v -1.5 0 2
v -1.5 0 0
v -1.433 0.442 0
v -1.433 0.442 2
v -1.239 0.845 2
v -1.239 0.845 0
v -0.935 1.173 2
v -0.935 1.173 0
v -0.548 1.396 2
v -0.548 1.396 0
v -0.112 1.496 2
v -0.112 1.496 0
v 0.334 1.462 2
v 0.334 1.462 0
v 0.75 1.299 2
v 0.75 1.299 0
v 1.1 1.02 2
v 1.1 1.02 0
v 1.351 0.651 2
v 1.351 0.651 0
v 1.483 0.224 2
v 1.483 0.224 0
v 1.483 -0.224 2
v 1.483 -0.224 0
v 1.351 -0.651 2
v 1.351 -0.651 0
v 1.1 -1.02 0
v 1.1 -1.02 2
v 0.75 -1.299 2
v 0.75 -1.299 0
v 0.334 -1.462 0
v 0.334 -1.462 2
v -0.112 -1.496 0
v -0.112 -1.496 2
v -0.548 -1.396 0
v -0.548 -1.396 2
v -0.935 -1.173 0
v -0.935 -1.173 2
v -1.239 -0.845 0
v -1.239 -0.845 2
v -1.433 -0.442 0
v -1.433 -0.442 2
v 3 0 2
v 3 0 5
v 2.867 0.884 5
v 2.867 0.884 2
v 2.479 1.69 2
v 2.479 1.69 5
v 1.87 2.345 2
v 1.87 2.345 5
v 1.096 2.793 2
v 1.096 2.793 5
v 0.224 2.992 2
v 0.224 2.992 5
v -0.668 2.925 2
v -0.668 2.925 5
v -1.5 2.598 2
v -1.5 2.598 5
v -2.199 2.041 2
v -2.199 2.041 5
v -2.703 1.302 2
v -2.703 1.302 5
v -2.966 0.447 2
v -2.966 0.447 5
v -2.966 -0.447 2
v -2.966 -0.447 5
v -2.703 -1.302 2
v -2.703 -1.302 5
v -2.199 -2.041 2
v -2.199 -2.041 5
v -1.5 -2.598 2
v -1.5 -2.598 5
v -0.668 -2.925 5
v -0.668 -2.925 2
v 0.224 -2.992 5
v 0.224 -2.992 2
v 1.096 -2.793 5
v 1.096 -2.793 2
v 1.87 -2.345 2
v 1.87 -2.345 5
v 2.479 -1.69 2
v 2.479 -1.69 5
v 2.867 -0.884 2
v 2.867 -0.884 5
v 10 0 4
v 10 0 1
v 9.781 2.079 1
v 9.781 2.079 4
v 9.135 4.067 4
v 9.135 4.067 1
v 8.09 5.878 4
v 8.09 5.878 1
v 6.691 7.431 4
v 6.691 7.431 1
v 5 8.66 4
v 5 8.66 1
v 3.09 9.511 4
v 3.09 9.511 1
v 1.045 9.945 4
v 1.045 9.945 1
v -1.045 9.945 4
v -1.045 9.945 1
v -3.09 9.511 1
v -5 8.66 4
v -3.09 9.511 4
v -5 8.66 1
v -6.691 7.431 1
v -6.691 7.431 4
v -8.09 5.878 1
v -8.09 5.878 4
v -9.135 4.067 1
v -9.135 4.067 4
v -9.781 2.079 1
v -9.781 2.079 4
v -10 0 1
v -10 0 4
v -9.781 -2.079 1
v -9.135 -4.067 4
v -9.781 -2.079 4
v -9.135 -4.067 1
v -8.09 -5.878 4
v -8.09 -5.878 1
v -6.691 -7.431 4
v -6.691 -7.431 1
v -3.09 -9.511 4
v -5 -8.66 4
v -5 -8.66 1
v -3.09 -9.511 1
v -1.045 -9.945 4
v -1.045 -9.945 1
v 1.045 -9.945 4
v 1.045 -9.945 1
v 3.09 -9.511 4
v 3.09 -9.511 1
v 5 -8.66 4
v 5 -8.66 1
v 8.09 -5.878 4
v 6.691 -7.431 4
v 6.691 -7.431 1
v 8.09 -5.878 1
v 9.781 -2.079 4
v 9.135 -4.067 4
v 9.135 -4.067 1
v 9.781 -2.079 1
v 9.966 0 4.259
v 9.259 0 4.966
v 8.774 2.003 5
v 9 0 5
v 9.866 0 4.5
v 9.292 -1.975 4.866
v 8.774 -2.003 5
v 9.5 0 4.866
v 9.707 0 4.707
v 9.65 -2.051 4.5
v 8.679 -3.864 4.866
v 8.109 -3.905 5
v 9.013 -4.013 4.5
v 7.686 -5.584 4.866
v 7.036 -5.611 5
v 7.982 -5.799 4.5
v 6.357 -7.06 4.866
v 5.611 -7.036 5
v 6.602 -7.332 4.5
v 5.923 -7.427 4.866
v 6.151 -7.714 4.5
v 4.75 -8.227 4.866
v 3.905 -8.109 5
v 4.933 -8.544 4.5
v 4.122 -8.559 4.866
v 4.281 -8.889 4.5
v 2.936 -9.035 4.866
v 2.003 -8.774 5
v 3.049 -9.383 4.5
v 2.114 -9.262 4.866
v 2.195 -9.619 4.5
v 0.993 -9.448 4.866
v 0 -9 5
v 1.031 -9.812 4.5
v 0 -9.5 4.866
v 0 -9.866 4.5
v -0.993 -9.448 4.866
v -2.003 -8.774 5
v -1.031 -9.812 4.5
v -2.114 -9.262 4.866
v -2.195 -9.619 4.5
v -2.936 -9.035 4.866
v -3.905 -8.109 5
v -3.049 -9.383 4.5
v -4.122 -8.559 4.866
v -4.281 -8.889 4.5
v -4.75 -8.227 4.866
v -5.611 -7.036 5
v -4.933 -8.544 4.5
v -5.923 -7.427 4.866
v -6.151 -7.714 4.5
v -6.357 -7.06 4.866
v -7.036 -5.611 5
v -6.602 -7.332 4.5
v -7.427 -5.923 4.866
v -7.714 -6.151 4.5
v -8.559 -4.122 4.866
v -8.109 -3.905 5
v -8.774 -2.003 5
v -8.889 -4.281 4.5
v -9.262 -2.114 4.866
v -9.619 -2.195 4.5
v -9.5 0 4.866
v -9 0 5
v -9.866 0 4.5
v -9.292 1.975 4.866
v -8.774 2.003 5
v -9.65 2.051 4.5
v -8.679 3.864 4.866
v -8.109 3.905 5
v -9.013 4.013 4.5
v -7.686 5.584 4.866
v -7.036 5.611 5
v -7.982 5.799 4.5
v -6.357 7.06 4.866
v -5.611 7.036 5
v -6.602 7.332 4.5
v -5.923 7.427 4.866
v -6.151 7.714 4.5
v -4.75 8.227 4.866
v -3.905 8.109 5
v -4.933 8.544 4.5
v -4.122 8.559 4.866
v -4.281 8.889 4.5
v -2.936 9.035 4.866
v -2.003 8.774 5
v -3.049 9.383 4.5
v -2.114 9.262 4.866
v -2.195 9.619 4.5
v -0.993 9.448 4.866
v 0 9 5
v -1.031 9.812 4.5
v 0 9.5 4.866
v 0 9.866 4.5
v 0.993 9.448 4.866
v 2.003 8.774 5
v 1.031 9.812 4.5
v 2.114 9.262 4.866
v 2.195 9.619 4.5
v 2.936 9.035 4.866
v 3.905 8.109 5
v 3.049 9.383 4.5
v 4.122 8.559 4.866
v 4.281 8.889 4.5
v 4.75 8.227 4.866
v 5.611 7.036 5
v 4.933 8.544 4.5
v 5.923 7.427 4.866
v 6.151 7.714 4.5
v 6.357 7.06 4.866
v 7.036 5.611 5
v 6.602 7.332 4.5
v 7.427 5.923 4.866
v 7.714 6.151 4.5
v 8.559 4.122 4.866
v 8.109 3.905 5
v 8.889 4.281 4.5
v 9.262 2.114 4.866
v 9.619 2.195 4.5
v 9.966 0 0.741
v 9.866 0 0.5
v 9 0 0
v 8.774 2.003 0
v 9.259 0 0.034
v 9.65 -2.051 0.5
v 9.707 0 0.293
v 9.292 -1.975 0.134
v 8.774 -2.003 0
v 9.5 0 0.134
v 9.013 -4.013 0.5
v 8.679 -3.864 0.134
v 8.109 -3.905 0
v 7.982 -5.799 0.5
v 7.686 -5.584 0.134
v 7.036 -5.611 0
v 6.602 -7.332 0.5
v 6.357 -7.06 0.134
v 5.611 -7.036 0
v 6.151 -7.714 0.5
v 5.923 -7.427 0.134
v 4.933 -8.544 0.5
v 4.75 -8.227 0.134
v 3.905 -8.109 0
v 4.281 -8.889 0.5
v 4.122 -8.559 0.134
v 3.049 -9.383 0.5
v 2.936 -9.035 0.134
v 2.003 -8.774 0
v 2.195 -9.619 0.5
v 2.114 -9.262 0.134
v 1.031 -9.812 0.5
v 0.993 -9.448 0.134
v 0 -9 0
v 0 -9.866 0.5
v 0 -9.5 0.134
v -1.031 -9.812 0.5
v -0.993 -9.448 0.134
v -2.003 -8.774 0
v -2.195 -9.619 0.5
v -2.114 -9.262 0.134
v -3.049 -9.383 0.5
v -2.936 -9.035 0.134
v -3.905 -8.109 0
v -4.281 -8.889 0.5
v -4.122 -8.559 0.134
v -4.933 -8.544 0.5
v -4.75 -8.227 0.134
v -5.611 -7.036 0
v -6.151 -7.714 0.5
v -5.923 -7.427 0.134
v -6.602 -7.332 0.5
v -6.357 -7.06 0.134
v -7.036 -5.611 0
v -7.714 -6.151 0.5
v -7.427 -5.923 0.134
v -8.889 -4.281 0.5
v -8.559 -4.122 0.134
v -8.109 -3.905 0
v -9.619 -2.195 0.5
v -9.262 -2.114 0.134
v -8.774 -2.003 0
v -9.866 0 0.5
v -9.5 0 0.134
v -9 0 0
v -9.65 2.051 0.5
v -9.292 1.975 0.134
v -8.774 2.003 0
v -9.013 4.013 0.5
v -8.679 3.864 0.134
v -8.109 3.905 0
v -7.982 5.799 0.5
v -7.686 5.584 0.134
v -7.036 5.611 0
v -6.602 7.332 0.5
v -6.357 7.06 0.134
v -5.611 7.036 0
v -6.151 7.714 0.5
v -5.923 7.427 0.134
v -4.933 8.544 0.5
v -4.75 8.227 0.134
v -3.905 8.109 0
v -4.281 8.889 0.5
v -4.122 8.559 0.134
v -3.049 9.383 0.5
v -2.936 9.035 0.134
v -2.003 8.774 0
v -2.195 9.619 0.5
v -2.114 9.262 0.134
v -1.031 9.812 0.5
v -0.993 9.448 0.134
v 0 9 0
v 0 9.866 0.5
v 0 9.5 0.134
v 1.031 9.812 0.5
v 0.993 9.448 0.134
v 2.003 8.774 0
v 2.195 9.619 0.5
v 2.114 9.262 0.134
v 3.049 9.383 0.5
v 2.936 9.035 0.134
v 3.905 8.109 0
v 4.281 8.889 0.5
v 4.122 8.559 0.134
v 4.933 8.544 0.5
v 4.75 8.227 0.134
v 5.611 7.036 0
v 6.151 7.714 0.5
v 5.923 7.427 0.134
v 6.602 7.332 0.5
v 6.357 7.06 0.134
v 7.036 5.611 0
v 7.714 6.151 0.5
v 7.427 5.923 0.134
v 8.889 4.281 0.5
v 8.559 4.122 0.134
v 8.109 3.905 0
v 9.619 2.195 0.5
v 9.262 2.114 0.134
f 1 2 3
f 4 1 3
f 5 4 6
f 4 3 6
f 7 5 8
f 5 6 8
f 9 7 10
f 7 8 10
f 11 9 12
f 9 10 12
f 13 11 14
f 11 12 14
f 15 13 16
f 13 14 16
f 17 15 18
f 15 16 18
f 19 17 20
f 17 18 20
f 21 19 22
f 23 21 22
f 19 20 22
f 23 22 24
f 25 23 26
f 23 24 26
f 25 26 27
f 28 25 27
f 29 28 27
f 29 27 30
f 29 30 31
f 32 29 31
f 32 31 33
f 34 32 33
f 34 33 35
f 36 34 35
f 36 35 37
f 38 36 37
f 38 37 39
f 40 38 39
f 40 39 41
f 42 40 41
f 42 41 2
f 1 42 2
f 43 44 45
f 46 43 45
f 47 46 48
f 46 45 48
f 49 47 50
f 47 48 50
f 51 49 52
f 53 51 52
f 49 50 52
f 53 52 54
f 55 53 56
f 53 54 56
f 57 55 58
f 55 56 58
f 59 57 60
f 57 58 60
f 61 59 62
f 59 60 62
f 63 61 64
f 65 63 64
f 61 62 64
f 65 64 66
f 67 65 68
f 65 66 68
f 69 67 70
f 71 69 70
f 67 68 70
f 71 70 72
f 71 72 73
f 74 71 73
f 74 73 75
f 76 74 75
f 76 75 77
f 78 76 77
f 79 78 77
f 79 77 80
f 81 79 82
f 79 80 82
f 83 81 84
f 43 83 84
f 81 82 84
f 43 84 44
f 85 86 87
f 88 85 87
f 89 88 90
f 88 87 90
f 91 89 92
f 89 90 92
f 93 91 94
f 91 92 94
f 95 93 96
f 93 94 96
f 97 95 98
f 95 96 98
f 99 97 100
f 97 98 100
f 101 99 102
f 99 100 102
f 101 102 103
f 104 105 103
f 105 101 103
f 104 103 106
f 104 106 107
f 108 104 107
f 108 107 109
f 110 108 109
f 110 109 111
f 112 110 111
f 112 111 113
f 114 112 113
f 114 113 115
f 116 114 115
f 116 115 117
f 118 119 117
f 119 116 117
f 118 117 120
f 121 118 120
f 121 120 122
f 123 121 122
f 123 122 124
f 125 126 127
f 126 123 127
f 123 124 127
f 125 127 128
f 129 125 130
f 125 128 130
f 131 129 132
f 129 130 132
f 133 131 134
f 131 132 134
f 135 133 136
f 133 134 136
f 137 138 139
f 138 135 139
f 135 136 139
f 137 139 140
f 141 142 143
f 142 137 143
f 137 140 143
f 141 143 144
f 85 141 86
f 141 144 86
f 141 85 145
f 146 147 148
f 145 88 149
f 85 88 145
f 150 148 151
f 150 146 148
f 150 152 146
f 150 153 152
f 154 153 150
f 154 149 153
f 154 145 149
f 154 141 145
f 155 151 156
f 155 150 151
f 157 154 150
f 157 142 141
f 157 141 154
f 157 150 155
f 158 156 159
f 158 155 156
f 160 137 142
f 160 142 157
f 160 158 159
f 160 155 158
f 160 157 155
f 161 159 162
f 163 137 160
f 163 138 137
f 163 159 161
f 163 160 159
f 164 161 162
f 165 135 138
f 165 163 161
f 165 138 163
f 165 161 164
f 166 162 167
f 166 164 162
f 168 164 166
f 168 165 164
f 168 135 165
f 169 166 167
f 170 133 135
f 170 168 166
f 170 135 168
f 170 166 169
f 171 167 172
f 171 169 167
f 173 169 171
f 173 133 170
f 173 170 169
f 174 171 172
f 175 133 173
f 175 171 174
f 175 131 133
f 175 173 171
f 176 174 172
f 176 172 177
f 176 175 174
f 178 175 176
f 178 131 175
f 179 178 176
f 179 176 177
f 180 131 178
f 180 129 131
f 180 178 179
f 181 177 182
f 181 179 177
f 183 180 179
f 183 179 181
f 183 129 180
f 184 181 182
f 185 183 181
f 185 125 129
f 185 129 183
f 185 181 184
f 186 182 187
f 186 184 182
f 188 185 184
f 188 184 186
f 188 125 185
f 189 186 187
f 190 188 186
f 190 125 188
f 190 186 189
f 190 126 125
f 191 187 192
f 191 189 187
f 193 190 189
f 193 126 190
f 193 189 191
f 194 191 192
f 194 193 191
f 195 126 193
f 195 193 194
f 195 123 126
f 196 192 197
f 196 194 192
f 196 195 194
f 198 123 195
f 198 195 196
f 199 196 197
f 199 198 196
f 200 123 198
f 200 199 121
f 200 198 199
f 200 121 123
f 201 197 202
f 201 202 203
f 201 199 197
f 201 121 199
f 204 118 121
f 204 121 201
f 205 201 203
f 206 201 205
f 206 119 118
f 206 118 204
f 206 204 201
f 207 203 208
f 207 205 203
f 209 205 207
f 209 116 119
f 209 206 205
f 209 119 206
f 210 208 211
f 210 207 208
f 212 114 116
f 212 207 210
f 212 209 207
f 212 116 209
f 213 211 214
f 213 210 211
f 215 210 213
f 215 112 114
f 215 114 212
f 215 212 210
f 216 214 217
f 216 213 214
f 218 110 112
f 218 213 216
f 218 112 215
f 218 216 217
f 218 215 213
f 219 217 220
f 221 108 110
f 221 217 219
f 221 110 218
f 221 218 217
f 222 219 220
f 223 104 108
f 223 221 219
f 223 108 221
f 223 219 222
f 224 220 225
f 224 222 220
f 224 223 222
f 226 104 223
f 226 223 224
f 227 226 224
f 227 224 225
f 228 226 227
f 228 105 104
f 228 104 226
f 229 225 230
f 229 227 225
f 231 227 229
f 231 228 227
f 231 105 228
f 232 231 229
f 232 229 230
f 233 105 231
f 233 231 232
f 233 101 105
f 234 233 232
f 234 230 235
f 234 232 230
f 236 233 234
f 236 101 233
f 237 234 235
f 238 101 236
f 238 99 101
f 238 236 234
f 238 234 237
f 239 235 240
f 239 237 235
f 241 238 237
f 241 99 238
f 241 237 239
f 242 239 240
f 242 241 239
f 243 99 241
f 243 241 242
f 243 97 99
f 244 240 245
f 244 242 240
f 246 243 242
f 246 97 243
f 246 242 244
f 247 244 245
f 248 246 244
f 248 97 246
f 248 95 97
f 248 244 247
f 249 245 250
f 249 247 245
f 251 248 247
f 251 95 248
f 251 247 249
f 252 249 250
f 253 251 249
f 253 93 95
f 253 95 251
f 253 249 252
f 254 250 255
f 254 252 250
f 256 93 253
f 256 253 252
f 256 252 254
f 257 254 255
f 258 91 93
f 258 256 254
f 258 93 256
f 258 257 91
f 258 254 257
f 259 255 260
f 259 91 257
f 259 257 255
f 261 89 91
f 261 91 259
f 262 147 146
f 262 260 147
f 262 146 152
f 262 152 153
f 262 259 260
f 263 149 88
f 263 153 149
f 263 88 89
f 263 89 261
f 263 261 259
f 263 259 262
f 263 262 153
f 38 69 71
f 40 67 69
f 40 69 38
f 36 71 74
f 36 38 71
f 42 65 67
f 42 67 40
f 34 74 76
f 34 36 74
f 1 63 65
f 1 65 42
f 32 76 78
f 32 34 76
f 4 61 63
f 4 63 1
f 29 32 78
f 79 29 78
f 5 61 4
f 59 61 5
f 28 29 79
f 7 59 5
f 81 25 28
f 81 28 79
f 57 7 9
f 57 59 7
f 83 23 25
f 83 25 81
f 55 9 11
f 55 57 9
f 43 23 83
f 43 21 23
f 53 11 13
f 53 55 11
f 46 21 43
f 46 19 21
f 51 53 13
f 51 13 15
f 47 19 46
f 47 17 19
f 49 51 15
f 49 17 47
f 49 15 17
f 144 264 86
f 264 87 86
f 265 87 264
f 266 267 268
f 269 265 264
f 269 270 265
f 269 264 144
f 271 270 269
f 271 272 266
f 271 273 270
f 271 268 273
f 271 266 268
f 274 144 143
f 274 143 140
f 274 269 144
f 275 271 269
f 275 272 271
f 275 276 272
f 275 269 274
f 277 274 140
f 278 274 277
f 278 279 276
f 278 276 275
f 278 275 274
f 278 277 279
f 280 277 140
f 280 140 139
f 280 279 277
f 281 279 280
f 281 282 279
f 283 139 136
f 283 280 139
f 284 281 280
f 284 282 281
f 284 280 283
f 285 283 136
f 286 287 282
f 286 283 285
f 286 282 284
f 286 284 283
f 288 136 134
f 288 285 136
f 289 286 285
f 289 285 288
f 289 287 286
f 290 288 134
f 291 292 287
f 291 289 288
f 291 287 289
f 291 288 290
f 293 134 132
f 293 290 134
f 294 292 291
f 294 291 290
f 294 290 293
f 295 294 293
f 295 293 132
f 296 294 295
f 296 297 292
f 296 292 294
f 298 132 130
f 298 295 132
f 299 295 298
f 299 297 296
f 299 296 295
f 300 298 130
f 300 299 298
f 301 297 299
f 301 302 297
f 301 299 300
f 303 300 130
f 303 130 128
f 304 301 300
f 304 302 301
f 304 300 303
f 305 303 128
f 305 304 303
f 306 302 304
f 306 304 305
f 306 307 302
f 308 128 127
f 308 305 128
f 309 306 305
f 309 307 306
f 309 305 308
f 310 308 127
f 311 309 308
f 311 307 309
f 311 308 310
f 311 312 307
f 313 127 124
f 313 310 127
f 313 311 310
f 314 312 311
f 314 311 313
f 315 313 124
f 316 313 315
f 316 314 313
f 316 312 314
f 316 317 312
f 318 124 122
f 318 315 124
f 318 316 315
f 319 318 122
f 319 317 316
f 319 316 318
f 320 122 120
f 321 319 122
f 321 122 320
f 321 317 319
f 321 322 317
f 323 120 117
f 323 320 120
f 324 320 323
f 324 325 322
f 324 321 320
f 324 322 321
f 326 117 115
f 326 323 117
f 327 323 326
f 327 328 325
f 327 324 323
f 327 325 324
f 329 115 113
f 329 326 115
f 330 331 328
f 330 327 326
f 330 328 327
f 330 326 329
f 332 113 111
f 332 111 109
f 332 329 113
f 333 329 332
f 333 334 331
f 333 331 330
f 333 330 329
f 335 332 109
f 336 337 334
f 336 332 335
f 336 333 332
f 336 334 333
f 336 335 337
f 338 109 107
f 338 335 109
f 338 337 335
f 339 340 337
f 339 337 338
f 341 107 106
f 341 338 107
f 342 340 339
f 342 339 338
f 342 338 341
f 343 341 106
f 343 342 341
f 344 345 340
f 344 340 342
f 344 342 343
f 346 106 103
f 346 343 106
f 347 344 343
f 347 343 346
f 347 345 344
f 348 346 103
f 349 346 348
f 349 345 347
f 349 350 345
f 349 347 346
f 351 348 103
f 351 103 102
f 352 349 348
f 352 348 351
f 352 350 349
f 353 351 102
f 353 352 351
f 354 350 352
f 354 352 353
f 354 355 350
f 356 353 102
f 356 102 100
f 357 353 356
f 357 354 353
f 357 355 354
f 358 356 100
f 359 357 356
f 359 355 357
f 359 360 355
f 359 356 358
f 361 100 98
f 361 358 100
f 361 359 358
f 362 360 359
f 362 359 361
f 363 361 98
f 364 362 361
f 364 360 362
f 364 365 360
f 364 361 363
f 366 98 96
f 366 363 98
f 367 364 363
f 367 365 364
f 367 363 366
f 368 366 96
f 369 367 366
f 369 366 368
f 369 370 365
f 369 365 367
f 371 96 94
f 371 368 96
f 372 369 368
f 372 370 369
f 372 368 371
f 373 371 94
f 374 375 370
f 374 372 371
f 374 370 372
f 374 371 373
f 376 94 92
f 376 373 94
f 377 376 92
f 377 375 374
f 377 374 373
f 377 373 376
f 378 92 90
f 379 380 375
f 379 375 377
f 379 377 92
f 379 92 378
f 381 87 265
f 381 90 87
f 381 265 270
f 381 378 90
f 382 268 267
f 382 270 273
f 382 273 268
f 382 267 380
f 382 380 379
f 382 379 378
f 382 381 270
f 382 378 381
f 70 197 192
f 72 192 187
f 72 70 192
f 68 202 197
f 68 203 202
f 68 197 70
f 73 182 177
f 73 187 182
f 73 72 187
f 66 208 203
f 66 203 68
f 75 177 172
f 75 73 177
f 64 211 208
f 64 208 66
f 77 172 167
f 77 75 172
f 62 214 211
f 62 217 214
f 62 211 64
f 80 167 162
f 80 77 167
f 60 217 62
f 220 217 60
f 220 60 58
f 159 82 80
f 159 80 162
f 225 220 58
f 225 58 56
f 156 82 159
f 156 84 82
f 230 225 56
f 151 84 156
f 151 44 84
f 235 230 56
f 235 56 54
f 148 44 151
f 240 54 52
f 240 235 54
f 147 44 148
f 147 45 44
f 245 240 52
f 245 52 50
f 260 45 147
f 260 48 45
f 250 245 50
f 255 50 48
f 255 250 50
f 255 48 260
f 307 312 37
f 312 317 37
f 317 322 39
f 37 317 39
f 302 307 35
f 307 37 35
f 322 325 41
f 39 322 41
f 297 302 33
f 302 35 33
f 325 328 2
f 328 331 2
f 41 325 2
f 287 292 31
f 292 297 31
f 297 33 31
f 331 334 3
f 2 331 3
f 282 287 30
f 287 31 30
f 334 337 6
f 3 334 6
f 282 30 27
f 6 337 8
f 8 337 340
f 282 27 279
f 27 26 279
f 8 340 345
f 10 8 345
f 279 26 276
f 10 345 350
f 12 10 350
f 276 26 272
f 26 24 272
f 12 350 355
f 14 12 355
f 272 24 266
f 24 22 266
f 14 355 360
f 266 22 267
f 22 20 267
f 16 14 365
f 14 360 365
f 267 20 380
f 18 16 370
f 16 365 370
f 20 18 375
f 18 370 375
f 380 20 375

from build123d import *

# Parameters (mm, degrees)
ESQUISSE1_R             = 10
BOSS_EXTRU_1_DEPTH      = 5
ESQUISSE2_R             = 3
ENL_V_MAT_EXTRU_1_DEPTH = 3
ESQUISSE9_R             = 1.5
ENL_V_MAT_EXTRU_2_DEPTH = 3


with BuildPart() as part:
    # Esquisse1 → Boss.-Extru.1 (new body)
    with BuildSketch(Plane.XY):
        Circle(ESQUISSE1_R)
    extrude(amount=BOSS_EXTRU_1_DEPTH)

    # Esquisse2 → Enlèv. mat.-Extru.1 (cut)
    with BuildSketch(Plane.XY.offset(5)):
        Circle(ESQUISSE2_R)
    extrude(amount=-ENL_V_MAT_EXTRU_1_DEPTH, mode=Mode.SUBTRACT)

    # Esquisse3 → Enlèvement de matière-Révolution1 (revolve, cut)
    with BuildSketch(Plane(origin=(0, 0, 0), x_dir=(0, 0, -1), z_dir=(1, 0, 0)), mode=Mode.PRIVATE) as enl_vement_de_mati_re_r_volution1_sk:
        with BuildLine():
            Line((0, 10), (-1, 10))
            ThreePointArc((-1, 10), (-0.292893219, 9.707106781), (0, 9))
            Line((0, 9), (0, 10))
        make_face()
        with BuildLine():
            Line((-4, 10), (-5, 10))
            Line((-5, 10), (-5, 9))
            ThreePointArc((-5, 9), (-4.707106781, 9.707106781), (-4, 10))
        make_face()
    revolve(enl_vement_de_mati_re_r_volution1_sk.sketch.rotate(Axis((0, 0, 5), (0, 0, -1)), 90), axis=Axis((0, 0, 5), (0, 0, -1)), mode=Mode.SUBTRACT)

    # Esquisse9 → Enlèv. mat.-Extru.2 (cut)
    with BuildSketch(Plane(origin=(0, 0, 0), x_dir=(-1, 0, 0), z_dir=(0, 0, -1))):
        Circle(ESQUISSE9_R)
    extrude(amount=-ENL_V_MAT_EXTRU_2_DEPTH, mode=Mode.SUBTRACT)


solid = part.part
